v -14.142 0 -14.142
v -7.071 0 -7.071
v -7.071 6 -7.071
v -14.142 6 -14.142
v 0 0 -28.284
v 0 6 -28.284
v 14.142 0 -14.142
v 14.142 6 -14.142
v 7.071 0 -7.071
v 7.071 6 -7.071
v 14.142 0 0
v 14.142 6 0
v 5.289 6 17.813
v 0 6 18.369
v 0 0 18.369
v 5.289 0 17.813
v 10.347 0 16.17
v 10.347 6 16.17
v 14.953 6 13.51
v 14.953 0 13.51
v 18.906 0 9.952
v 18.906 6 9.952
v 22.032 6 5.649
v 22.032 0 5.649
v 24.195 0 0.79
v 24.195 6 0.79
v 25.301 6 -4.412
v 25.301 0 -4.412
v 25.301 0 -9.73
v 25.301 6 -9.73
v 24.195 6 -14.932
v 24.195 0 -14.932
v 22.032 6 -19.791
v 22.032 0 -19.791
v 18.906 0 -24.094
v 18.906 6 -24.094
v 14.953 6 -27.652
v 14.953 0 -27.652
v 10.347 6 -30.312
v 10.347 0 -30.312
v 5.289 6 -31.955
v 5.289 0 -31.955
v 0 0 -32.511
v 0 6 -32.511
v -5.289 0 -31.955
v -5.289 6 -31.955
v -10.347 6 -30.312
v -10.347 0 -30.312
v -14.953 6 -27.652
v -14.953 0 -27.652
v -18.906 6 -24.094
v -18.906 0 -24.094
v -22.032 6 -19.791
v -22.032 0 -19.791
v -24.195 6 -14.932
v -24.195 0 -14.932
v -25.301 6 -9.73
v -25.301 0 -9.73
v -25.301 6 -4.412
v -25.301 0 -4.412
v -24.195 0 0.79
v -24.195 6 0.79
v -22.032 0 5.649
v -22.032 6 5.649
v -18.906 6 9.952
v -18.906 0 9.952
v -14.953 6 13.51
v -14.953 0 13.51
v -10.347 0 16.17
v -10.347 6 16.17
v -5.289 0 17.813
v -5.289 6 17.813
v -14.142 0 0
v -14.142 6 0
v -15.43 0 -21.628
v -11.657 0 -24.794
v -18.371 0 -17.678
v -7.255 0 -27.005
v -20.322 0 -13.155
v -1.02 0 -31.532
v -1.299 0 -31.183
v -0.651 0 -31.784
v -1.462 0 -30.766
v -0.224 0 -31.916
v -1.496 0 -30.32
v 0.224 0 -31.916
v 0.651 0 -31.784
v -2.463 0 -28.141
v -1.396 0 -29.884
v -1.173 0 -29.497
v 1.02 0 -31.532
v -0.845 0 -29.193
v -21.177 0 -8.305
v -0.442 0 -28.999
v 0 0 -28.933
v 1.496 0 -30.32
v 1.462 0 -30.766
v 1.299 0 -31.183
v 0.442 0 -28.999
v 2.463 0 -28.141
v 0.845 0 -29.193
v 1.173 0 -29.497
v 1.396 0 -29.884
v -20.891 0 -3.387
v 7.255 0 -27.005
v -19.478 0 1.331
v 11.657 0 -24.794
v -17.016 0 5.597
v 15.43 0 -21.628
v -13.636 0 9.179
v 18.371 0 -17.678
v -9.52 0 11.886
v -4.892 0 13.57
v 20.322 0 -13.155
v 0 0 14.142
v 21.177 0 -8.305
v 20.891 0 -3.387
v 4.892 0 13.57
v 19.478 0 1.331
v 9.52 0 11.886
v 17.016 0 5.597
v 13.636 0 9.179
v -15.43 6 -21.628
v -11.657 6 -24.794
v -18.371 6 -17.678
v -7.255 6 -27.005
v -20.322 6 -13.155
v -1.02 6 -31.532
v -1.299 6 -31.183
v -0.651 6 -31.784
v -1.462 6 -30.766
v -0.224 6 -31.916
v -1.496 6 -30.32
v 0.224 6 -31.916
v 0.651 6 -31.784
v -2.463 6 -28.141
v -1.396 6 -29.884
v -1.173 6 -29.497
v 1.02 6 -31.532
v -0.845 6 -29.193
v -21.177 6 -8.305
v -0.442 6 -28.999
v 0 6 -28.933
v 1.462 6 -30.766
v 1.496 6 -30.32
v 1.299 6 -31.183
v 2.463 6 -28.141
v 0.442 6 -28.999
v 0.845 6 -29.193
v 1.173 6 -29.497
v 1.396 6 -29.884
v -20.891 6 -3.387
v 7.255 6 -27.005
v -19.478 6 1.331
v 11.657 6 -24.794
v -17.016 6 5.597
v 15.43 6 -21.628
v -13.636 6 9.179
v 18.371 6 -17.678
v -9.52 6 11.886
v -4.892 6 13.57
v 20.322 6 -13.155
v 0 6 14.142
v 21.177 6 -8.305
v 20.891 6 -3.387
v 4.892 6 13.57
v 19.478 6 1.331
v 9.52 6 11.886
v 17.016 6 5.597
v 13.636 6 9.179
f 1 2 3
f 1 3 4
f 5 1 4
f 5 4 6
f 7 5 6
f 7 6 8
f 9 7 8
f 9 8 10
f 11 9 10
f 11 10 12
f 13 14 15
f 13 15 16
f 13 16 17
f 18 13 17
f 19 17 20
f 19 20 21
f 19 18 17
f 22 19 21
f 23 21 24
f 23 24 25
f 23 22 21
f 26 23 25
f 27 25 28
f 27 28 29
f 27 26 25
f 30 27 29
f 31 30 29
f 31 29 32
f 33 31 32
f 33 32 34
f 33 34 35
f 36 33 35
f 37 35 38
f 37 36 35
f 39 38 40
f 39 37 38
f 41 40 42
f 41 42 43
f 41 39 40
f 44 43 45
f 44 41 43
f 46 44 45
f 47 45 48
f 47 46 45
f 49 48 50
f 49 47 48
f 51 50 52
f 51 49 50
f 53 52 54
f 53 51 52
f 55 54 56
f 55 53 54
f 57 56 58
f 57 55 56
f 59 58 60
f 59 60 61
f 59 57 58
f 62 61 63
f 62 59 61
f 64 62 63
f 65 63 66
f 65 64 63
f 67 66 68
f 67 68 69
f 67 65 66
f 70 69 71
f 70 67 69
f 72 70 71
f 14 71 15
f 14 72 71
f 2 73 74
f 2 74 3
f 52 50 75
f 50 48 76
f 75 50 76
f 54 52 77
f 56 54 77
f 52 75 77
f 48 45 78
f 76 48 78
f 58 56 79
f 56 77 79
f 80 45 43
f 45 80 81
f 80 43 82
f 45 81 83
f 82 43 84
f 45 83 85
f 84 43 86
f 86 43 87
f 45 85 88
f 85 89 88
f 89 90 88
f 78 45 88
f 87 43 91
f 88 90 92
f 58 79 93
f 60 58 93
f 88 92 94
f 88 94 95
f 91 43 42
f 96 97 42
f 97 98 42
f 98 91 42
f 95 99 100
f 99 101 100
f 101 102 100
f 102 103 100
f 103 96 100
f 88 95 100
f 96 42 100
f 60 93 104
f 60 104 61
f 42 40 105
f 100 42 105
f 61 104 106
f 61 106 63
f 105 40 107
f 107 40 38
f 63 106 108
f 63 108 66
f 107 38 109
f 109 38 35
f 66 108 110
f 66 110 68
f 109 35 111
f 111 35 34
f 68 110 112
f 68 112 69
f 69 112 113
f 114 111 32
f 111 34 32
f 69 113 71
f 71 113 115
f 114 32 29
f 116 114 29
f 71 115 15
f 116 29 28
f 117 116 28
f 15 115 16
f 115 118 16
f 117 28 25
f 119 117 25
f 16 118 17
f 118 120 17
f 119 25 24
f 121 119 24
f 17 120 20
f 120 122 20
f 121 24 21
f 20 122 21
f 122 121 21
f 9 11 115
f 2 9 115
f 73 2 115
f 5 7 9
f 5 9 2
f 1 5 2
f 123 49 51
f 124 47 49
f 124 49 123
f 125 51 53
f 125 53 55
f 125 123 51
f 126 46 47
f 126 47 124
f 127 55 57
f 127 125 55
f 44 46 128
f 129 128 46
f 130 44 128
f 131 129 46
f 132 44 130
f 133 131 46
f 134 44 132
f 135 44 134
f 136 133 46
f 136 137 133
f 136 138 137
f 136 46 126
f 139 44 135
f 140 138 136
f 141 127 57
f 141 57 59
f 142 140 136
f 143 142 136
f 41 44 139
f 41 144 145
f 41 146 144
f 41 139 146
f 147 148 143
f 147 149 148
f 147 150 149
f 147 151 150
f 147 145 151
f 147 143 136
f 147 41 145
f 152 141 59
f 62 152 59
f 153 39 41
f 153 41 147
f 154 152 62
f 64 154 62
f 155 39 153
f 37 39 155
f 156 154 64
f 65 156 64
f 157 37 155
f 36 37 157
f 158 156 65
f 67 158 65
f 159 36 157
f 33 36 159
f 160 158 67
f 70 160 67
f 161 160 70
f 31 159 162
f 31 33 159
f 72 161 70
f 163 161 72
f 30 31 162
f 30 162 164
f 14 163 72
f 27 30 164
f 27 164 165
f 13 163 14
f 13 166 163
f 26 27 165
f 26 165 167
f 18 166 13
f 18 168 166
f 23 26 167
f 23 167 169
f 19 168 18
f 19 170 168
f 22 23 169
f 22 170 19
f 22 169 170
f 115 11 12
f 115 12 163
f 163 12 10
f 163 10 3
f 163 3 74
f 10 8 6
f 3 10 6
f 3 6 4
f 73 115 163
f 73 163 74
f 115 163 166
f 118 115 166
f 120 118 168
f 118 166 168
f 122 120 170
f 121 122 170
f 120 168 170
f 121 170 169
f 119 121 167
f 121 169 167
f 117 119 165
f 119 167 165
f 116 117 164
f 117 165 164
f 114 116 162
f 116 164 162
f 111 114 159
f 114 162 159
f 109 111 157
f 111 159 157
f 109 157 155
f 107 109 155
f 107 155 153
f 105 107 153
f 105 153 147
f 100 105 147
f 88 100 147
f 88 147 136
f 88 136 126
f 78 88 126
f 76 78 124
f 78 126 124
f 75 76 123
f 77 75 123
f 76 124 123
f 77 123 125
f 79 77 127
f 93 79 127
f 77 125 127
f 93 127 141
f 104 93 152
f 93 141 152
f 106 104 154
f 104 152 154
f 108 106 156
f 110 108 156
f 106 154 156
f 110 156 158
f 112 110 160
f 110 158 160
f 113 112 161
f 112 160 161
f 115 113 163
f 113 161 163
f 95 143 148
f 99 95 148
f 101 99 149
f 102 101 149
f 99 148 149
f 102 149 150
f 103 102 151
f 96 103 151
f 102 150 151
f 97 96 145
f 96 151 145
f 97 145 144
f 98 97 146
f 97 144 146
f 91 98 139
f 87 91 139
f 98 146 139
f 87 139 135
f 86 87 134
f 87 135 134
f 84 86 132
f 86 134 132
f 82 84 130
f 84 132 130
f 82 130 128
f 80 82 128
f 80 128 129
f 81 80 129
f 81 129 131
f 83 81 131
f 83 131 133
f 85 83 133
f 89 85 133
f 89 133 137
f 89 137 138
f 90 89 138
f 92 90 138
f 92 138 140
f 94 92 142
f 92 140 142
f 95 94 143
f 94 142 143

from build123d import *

# Parameters (mm, degrees)
BOSS_EXTRUDE1_DEPTH = 6
SKETCH2_R           = 25.439986865
SKETCH2_R_2         = 21.213203436
BOSS_EXTRUDE2_DEPTH = 6
SKETCH3_R           = 1.5
CUT_EXTRUDE1_DEPTH  = 6


with BuildPart() as part:
    # Sketch1 → Boss-Extrude1 (new body)
    with BuildSketch(Plane(origin=(0, 0, 0), x_dir=(1, 0, 0), z_dir=(0, 1, 0))):
        Polygon((-14.142135624, 14.142135624), (0, 28.284271247), (14.142135624, 14.142135624), (7.071067812, 7.071067812), (14.142135624, 0), (0, -14.142135624), (-14.142135624, 0), (-7.071067812, 7.071067812), align=None)
    extrude(amount=BOSS_EXTRUDE1_DEPTH)


with BuildPart() as body_2:
    # Sketch2 → Boss-Extrude2 (new body)
    with BuildSketch(Plane(origin=(0, 6, 0), x_dir=(1, 0, 0), z_dir=(0, 1, 0))):
        with Locations(Location((0, 7.071067812, 0), (0, 0, 270))):
            Circle(SKETCH2_R)
        with Locations(Location((0, 7.071067812, 0), (0, 0, 270))):
            Circle(SKETCH2_R_2, mode=Mode.SUBTRACT)
    extrude(amount=-BOSS_EXTRUDE2_DEPTH)

    # Sketch3 → Cut-Extrude1 (cut)
    with BuildSketch(Plane(origin=(0, 6, 0), x_dir=(1, 0, 0), z_dir=(0, 1, 0))):
        with Locations(Location((0, 30.43250968, 0), (0, 0, 270))):
            Circle(SKETCH3_R)
    extrude(amount=-CUT_EXTRUDE1_DEPTH, mode=Mode.SUBTRACT)


solid = Compound([part.part, body_2.part])
